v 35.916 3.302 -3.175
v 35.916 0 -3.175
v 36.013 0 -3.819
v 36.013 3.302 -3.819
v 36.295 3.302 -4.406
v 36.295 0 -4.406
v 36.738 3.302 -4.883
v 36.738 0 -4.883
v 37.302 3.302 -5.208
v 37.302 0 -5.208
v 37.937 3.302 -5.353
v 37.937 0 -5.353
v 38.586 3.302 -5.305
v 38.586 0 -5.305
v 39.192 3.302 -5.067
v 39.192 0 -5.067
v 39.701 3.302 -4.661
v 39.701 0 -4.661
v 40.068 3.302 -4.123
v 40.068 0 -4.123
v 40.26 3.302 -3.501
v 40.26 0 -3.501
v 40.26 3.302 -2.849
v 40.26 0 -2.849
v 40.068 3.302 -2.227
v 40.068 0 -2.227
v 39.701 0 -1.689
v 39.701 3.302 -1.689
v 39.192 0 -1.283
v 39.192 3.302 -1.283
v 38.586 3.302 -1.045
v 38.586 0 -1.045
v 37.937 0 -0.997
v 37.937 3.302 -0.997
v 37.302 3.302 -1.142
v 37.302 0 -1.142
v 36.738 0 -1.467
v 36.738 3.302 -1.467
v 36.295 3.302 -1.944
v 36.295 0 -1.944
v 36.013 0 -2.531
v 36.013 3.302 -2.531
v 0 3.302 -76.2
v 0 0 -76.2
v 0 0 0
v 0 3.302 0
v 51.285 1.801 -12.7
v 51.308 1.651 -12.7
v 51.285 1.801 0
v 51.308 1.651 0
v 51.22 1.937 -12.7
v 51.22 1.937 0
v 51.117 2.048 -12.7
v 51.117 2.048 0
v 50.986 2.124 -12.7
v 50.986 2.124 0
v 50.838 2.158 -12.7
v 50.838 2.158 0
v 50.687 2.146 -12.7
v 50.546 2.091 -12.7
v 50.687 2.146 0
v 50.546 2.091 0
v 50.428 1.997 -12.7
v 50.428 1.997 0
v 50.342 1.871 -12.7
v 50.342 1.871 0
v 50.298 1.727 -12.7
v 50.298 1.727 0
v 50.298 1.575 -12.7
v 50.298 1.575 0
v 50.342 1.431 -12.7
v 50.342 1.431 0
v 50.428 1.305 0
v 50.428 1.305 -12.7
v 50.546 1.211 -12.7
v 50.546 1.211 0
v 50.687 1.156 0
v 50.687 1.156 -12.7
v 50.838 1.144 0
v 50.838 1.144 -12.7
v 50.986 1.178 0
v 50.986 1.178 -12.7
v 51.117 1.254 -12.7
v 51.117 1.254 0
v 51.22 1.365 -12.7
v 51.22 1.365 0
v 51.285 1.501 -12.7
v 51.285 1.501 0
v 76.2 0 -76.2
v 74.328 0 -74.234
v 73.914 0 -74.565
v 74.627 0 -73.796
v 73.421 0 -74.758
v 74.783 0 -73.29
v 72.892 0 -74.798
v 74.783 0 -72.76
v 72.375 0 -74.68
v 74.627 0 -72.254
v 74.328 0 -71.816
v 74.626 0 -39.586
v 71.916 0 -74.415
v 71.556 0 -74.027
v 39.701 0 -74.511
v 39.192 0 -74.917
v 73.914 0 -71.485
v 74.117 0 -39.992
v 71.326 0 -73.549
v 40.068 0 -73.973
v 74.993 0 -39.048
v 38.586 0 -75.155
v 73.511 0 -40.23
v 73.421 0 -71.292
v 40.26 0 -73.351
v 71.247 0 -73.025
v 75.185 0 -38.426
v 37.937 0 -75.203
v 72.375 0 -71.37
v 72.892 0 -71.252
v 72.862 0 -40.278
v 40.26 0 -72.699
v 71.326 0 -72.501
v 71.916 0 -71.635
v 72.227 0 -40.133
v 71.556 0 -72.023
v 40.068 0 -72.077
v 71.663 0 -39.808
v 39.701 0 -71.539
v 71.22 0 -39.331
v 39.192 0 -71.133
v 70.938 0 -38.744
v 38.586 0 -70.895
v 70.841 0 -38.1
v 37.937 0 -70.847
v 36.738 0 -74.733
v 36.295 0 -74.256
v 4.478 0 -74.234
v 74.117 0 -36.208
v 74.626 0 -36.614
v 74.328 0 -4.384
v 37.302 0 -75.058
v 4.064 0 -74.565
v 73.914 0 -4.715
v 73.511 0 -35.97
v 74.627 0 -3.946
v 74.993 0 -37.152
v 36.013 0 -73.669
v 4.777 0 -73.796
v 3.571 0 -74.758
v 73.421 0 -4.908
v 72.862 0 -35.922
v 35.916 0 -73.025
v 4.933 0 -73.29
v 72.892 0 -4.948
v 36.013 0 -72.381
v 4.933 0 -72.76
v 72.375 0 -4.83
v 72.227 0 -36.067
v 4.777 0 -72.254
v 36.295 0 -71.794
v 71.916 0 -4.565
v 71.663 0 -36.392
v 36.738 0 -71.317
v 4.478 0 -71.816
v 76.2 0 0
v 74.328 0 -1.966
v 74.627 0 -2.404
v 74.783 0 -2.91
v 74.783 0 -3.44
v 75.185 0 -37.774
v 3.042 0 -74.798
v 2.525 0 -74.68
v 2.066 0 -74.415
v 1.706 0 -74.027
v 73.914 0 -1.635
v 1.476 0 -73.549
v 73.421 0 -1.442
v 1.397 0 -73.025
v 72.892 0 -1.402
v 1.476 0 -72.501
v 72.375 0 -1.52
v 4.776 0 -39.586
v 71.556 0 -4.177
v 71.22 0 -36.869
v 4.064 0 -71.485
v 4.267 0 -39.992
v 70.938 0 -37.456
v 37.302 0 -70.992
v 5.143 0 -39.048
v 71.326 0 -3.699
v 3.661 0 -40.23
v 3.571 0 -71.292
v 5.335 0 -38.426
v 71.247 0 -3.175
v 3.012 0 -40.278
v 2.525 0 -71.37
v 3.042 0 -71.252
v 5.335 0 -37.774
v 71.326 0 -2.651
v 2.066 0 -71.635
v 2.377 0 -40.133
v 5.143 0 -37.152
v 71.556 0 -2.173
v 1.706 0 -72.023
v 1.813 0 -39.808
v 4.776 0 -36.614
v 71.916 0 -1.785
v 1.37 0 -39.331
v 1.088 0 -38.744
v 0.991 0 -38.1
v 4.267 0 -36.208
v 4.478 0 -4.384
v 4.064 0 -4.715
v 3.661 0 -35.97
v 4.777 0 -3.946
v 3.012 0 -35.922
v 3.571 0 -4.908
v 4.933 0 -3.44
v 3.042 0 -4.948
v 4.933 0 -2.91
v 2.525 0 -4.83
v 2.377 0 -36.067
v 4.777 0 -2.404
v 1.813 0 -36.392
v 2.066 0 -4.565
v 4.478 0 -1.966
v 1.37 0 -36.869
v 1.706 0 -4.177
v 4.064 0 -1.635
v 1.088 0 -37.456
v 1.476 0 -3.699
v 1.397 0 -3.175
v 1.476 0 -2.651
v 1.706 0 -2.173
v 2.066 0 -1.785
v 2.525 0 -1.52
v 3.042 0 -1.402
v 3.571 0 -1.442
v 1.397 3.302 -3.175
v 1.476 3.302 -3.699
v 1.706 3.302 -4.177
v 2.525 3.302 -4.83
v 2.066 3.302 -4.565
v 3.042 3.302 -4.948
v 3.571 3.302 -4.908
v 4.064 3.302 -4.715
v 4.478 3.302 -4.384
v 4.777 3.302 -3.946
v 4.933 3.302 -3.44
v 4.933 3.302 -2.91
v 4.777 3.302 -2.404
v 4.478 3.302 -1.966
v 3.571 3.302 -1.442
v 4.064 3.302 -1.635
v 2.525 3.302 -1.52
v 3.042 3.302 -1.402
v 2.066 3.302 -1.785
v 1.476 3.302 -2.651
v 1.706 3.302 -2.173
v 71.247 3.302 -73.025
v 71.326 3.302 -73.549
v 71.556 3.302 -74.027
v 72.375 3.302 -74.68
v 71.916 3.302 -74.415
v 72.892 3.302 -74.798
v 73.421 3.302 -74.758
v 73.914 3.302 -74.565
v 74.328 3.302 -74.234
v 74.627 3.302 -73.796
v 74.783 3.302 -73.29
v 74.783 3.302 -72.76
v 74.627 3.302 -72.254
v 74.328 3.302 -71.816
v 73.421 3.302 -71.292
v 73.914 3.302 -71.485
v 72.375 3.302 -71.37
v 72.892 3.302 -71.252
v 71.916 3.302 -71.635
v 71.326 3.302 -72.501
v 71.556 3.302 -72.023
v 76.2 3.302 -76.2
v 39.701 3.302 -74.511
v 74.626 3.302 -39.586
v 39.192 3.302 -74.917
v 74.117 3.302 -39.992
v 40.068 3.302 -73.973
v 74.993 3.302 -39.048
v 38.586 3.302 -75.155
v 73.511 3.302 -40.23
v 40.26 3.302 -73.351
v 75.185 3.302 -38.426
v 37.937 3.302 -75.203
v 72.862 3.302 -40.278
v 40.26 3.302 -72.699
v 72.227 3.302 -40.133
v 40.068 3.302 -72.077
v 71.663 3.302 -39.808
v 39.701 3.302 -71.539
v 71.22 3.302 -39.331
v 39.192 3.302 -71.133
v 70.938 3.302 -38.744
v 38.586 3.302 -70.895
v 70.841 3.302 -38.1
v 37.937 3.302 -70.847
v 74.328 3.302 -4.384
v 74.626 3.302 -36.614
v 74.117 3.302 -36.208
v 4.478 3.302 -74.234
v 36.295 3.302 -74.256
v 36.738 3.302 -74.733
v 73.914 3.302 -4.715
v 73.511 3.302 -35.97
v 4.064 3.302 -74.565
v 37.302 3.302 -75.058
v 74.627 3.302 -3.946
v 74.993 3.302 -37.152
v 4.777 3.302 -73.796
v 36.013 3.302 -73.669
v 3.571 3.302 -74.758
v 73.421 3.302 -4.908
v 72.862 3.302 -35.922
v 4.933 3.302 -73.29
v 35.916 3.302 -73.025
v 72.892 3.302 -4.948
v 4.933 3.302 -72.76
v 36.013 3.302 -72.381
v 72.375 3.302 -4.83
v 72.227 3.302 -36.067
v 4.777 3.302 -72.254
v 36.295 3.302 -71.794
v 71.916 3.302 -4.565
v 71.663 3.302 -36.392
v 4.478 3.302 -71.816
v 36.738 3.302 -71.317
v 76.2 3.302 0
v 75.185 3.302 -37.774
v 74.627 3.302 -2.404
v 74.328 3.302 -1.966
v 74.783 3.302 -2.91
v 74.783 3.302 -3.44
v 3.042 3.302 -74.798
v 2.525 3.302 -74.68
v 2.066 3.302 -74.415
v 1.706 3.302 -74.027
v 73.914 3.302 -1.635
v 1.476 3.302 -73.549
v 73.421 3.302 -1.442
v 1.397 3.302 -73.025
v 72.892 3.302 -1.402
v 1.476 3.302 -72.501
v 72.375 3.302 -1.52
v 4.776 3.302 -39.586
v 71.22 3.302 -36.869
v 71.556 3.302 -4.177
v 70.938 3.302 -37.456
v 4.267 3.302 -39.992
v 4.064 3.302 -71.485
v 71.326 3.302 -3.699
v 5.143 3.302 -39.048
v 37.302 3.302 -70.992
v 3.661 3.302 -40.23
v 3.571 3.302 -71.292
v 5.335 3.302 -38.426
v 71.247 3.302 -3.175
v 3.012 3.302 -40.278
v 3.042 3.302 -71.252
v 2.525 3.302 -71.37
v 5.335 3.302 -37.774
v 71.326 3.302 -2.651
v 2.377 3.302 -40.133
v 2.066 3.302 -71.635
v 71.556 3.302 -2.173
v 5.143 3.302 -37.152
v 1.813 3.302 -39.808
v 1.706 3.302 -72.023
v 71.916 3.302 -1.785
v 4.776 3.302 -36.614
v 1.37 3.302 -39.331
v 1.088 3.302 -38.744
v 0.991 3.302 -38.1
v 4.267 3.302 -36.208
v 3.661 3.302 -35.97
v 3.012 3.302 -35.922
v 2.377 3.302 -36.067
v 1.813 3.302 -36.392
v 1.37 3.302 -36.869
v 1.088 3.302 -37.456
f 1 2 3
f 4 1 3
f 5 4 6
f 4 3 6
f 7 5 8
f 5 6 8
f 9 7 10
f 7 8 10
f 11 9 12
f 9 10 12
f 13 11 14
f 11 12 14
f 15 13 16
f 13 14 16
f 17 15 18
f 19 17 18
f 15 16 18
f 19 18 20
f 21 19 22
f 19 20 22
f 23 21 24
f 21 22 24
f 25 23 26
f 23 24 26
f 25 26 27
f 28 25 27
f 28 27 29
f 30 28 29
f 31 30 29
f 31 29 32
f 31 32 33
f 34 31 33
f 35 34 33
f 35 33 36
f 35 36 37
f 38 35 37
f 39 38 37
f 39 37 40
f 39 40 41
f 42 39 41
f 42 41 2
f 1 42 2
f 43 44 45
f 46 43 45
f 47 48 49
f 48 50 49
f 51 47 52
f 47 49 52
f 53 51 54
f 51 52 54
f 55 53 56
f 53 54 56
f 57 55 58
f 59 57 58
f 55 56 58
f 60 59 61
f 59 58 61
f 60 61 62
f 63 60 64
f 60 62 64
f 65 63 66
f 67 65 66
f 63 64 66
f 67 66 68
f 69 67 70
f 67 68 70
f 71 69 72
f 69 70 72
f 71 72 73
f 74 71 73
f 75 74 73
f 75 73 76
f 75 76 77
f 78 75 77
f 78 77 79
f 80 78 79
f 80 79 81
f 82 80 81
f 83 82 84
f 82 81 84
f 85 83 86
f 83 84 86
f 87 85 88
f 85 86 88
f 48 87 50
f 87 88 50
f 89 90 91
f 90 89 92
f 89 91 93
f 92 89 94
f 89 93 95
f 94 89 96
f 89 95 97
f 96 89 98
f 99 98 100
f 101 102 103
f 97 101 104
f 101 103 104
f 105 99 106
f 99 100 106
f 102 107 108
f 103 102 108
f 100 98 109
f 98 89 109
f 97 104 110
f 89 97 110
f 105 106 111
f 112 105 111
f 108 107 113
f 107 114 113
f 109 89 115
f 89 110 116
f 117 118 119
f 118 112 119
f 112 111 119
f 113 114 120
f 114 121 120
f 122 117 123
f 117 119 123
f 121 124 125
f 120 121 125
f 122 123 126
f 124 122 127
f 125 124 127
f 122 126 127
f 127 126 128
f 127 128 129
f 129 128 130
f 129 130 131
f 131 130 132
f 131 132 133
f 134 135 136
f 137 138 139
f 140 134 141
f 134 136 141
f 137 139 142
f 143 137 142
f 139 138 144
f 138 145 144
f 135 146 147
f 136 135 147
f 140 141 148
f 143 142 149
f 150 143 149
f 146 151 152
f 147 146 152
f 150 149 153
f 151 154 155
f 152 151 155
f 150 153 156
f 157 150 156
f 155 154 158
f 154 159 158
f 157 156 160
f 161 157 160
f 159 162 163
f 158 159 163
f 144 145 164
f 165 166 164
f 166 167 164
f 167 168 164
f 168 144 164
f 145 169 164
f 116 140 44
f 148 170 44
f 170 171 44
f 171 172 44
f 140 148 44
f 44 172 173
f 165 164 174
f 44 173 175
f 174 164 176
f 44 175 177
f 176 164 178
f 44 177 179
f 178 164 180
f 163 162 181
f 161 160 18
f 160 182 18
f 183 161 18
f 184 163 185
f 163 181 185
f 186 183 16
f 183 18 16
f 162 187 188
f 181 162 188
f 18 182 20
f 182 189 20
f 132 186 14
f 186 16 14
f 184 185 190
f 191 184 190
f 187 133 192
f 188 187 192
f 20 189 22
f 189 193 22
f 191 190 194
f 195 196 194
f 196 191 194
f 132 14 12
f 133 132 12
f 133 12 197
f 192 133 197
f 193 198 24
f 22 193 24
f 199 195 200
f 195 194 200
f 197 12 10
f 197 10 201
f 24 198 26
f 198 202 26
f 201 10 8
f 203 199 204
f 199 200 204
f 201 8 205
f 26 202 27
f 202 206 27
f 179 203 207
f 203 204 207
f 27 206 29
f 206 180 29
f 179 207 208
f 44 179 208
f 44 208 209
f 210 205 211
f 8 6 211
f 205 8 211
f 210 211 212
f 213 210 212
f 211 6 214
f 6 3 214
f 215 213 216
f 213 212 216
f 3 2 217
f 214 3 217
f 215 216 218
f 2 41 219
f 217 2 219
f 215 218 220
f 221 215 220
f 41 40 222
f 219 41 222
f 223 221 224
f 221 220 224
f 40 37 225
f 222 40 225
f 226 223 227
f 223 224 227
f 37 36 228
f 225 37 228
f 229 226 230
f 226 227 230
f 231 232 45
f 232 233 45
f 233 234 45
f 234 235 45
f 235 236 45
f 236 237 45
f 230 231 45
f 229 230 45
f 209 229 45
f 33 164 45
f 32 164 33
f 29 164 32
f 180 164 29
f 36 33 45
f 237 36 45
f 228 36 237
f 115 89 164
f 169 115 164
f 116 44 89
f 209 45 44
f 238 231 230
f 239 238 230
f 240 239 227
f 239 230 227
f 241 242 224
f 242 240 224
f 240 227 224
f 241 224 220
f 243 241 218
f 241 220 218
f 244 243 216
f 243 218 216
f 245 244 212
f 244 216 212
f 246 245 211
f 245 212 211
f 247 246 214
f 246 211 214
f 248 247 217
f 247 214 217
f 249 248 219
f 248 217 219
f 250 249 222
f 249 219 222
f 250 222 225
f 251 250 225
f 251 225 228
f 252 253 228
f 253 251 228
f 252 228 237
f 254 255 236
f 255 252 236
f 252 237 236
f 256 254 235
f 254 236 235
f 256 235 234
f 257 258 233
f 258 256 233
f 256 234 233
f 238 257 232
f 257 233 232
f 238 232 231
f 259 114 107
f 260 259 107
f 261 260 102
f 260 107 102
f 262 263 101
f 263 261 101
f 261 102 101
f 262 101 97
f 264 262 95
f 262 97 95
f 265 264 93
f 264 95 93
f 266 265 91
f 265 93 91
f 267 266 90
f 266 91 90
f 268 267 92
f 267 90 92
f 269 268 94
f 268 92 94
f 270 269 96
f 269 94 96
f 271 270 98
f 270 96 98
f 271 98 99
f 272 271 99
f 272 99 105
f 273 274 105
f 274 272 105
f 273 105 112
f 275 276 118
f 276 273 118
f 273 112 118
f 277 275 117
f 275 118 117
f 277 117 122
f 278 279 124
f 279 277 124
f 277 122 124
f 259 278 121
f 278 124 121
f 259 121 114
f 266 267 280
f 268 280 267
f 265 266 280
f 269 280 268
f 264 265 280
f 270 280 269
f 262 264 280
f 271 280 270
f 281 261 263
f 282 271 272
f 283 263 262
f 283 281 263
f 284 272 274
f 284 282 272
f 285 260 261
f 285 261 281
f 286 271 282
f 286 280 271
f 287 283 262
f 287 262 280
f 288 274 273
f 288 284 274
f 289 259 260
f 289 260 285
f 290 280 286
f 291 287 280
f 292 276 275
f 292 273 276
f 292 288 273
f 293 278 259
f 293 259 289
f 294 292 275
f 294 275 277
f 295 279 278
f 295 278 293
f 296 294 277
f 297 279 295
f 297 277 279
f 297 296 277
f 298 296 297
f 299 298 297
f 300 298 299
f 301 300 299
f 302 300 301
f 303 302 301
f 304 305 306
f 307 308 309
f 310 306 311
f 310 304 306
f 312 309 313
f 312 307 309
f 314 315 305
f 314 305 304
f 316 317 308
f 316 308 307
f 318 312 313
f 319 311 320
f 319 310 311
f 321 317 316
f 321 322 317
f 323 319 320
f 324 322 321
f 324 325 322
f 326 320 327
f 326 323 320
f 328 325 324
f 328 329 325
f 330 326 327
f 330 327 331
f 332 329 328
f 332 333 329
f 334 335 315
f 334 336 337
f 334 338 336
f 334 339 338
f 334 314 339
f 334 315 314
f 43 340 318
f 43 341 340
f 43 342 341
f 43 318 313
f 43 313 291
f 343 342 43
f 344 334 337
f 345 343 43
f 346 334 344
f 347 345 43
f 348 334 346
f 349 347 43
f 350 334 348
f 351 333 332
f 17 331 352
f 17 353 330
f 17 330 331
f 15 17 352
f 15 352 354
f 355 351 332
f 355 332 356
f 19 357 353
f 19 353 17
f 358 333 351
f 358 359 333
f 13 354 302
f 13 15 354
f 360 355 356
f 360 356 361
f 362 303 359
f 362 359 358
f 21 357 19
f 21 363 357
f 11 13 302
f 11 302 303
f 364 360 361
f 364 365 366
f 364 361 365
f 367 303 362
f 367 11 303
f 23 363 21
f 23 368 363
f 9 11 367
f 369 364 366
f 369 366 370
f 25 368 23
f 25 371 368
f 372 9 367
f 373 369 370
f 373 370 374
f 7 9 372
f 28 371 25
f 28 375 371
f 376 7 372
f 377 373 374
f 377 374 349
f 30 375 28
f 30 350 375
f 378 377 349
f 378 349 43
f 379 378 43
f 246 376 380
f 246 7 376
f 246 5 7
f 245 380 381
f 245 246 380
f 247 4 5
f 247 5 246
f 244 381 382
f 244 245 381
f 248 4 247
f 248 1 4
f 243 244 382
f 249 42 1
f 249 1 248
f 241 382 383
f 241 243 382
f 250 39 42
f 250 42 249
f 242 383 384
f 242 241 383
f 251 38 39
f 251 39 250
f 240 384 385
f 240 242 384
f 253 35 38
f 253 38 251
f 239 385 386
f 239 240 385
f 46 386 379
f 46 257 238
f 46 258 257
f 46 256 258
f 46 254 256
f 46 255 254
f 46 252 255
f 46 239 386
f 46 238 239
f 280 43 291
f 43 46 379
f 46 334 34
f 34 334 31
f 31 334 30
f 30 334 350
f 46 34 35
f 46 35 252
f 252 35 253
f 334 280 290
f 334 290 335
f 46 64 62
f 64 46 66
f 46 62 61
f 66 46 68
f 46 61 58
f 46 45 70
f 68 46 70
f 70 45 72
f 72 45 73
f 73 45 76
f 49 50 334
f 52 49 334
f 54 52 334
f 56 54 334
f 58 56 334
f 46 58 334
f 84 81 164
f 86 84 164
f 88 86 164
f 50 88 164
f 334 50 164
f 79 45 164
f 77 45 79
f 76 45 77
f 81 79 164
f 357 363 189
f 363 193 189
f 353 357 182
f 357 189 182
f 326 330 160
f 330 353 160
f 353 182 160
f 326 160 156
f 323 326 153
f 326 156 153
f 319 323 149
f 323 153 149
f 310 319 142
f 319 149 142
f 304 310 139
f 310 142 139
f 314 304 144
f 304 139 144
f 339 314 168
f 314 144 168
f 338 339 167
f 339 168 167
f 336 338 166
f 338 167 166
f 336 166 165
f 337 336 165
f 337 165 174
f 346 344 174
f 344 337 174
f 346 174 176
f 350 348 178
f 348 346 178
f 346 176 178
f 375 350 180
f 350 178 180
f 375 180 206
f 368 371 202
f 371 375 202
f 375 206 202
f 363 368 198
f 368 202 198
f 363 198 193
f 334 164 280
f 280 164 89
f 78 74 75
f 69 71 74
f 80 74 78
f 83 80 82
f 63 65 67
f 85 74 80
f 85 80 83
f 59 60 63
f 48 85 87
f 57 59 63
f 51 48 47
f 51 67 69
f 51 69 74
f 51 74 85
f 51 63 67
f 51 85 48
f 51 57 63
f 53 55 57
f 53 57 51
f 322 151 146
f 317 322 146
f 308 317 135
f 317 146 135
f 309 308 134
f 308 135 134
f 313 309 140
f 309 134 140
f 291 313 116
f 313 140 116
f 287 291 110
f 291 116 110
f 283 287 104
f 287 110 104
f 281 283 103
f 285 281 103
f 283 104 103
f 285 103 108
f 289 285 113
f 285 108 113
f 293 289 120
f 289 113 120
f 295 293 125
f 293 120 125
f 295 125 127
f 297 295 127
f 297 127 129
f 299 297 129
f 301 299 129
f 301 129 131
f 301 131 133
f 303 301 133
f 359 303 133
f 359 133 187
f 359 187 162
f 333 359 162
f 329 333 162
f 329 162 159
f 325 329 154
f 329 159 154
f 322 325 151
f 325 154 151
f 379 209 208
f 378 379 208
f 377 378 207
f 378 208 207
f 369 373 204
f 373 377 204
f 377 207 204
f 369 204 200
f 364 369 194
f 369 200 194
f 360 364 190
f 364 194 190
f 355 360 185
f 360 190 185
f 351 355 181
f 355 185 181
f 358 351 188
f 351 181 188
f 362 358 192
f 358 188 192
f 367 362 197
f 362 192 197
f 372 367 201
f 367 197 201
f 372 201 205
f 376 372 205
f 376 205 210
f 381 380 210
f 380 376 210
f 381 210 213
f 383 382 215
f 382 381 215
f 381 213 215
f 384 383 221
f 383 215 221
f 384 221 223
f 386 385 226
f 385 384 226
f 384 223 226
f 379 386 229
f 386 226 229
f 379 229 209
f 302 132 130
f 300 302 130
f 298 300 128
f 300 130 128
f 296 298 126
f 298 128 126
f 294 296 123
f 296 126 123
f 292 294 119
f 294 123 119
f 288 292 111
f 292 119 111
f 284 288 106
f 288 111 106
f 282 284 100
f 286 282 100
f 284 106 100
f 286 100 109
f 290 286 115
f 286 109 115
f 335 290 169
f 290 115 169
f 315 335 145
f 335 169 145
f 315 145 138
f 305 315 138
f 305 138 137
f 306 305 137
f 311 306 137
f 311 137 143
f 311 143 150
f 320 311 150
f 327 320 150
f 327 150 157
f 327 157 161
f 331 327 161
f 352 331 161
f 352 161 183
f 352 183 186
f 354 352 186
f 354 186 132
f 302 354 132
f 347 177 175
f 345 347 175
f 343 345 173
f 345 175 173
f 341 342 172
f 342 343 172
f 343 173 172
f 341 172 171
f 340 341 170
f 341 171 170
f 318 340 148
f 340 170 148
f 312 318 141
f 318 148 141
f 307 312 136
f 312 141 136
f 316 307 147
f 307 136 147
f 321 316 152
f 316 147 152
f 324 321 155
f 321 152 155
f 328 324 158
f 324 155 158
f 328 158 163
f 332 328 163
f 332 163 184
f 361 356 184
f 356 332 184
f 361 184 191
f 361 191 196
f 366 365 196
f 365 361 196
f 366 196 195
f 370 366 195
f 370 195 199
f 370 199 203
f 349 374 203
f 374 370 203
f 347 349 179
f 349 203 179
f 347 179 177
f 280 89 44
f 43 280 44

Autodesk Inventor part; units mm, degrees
ref_plane "YZ Plane" through (0, 0, 0) normal (1, 0, 0) x (0, 1, 0)
ref_plane "XZ Plane" through (0, 0, 0) normal (0, 1, 0) x (-1, 0, 0)
ref_plane "XY Plane" through (0, 0, 0) normal (0, 0, 1) x (1, 0, 0)
sketch "Sketch1" plane through (0, 0, 0) normal (0, 1, 0) x (-1, 0, 0)
  line L0 (0, 0) -> (-76.2, 0)
  line L1 (-76.2, 0) -> (-76.2, -76.2)
  line L2 (-76.2, -76.2) -> (0, -76.2)
  line L3 (0, -76.2) -> (0, 0)
  line L4 (-38.1, -76.2) -> (-38.1, -73.025)
  circle A0 centre (-38.1, -73.025) radius 2.1844
  line L5 (0, -38.1) -> (-3.175, -38.1)
  line L6 (-38.1, 0) -> (-38.1, -3.175)
  line L7 (-76.2, -38.1) -> (-73.025, -38.1)
  circle A1 centre (-3.175, -38.1) radius 2.1844
  circle A2 centre (-73.025, -38.1) radius 2.1844
  circle A3 centre (-38.1, -3.175) radius 2.1844
  circle A4 centre (-3.175, -73.025) radius 1.778
  circle A5 centre (-3.175, -3.175) radius 1.778
  circle A6 centre (-73.025, -3.175) radius 1.778
  circle A7 centre (-73.025, -73.025) radius 1.778
  dimension "d0" = 76.2
  dimension "d1" = 76.2
  dimension "d2" = 3.175
  dimension "d3" = 4.3688
  dimension "d4" = 3.175
  dimension "d5" = 3.175
  dimension "d6" = 3.175
  dimension "d7" = 4.3688
  dimension "d8" = 4.3688
  dimension "d9" = 4.3688
  dimension "d10" = 3.556
  dimension "d11" = 3.556
  dimension "d12" = 3.556
  dimension "d13" = 3.556
extrude "Extrusion1" add sketch "Sketch1" along normal blind 3.302
sketch "Sketch2" plane through (0, 0, 0) normal (0, 0, 1) x (1, 0, 0)
  line L0 (76.2, 0) -> (76.2, 3.302) projected
  circle A0 centre (50.8, 1.651) radius 0.508
  point P0 (0, 0)
  dimension "d17" = 1.016
extrude "Extrusion2" cut sketch "Sketch2" against normal blind 12.7
properties part number "cold_plate"
